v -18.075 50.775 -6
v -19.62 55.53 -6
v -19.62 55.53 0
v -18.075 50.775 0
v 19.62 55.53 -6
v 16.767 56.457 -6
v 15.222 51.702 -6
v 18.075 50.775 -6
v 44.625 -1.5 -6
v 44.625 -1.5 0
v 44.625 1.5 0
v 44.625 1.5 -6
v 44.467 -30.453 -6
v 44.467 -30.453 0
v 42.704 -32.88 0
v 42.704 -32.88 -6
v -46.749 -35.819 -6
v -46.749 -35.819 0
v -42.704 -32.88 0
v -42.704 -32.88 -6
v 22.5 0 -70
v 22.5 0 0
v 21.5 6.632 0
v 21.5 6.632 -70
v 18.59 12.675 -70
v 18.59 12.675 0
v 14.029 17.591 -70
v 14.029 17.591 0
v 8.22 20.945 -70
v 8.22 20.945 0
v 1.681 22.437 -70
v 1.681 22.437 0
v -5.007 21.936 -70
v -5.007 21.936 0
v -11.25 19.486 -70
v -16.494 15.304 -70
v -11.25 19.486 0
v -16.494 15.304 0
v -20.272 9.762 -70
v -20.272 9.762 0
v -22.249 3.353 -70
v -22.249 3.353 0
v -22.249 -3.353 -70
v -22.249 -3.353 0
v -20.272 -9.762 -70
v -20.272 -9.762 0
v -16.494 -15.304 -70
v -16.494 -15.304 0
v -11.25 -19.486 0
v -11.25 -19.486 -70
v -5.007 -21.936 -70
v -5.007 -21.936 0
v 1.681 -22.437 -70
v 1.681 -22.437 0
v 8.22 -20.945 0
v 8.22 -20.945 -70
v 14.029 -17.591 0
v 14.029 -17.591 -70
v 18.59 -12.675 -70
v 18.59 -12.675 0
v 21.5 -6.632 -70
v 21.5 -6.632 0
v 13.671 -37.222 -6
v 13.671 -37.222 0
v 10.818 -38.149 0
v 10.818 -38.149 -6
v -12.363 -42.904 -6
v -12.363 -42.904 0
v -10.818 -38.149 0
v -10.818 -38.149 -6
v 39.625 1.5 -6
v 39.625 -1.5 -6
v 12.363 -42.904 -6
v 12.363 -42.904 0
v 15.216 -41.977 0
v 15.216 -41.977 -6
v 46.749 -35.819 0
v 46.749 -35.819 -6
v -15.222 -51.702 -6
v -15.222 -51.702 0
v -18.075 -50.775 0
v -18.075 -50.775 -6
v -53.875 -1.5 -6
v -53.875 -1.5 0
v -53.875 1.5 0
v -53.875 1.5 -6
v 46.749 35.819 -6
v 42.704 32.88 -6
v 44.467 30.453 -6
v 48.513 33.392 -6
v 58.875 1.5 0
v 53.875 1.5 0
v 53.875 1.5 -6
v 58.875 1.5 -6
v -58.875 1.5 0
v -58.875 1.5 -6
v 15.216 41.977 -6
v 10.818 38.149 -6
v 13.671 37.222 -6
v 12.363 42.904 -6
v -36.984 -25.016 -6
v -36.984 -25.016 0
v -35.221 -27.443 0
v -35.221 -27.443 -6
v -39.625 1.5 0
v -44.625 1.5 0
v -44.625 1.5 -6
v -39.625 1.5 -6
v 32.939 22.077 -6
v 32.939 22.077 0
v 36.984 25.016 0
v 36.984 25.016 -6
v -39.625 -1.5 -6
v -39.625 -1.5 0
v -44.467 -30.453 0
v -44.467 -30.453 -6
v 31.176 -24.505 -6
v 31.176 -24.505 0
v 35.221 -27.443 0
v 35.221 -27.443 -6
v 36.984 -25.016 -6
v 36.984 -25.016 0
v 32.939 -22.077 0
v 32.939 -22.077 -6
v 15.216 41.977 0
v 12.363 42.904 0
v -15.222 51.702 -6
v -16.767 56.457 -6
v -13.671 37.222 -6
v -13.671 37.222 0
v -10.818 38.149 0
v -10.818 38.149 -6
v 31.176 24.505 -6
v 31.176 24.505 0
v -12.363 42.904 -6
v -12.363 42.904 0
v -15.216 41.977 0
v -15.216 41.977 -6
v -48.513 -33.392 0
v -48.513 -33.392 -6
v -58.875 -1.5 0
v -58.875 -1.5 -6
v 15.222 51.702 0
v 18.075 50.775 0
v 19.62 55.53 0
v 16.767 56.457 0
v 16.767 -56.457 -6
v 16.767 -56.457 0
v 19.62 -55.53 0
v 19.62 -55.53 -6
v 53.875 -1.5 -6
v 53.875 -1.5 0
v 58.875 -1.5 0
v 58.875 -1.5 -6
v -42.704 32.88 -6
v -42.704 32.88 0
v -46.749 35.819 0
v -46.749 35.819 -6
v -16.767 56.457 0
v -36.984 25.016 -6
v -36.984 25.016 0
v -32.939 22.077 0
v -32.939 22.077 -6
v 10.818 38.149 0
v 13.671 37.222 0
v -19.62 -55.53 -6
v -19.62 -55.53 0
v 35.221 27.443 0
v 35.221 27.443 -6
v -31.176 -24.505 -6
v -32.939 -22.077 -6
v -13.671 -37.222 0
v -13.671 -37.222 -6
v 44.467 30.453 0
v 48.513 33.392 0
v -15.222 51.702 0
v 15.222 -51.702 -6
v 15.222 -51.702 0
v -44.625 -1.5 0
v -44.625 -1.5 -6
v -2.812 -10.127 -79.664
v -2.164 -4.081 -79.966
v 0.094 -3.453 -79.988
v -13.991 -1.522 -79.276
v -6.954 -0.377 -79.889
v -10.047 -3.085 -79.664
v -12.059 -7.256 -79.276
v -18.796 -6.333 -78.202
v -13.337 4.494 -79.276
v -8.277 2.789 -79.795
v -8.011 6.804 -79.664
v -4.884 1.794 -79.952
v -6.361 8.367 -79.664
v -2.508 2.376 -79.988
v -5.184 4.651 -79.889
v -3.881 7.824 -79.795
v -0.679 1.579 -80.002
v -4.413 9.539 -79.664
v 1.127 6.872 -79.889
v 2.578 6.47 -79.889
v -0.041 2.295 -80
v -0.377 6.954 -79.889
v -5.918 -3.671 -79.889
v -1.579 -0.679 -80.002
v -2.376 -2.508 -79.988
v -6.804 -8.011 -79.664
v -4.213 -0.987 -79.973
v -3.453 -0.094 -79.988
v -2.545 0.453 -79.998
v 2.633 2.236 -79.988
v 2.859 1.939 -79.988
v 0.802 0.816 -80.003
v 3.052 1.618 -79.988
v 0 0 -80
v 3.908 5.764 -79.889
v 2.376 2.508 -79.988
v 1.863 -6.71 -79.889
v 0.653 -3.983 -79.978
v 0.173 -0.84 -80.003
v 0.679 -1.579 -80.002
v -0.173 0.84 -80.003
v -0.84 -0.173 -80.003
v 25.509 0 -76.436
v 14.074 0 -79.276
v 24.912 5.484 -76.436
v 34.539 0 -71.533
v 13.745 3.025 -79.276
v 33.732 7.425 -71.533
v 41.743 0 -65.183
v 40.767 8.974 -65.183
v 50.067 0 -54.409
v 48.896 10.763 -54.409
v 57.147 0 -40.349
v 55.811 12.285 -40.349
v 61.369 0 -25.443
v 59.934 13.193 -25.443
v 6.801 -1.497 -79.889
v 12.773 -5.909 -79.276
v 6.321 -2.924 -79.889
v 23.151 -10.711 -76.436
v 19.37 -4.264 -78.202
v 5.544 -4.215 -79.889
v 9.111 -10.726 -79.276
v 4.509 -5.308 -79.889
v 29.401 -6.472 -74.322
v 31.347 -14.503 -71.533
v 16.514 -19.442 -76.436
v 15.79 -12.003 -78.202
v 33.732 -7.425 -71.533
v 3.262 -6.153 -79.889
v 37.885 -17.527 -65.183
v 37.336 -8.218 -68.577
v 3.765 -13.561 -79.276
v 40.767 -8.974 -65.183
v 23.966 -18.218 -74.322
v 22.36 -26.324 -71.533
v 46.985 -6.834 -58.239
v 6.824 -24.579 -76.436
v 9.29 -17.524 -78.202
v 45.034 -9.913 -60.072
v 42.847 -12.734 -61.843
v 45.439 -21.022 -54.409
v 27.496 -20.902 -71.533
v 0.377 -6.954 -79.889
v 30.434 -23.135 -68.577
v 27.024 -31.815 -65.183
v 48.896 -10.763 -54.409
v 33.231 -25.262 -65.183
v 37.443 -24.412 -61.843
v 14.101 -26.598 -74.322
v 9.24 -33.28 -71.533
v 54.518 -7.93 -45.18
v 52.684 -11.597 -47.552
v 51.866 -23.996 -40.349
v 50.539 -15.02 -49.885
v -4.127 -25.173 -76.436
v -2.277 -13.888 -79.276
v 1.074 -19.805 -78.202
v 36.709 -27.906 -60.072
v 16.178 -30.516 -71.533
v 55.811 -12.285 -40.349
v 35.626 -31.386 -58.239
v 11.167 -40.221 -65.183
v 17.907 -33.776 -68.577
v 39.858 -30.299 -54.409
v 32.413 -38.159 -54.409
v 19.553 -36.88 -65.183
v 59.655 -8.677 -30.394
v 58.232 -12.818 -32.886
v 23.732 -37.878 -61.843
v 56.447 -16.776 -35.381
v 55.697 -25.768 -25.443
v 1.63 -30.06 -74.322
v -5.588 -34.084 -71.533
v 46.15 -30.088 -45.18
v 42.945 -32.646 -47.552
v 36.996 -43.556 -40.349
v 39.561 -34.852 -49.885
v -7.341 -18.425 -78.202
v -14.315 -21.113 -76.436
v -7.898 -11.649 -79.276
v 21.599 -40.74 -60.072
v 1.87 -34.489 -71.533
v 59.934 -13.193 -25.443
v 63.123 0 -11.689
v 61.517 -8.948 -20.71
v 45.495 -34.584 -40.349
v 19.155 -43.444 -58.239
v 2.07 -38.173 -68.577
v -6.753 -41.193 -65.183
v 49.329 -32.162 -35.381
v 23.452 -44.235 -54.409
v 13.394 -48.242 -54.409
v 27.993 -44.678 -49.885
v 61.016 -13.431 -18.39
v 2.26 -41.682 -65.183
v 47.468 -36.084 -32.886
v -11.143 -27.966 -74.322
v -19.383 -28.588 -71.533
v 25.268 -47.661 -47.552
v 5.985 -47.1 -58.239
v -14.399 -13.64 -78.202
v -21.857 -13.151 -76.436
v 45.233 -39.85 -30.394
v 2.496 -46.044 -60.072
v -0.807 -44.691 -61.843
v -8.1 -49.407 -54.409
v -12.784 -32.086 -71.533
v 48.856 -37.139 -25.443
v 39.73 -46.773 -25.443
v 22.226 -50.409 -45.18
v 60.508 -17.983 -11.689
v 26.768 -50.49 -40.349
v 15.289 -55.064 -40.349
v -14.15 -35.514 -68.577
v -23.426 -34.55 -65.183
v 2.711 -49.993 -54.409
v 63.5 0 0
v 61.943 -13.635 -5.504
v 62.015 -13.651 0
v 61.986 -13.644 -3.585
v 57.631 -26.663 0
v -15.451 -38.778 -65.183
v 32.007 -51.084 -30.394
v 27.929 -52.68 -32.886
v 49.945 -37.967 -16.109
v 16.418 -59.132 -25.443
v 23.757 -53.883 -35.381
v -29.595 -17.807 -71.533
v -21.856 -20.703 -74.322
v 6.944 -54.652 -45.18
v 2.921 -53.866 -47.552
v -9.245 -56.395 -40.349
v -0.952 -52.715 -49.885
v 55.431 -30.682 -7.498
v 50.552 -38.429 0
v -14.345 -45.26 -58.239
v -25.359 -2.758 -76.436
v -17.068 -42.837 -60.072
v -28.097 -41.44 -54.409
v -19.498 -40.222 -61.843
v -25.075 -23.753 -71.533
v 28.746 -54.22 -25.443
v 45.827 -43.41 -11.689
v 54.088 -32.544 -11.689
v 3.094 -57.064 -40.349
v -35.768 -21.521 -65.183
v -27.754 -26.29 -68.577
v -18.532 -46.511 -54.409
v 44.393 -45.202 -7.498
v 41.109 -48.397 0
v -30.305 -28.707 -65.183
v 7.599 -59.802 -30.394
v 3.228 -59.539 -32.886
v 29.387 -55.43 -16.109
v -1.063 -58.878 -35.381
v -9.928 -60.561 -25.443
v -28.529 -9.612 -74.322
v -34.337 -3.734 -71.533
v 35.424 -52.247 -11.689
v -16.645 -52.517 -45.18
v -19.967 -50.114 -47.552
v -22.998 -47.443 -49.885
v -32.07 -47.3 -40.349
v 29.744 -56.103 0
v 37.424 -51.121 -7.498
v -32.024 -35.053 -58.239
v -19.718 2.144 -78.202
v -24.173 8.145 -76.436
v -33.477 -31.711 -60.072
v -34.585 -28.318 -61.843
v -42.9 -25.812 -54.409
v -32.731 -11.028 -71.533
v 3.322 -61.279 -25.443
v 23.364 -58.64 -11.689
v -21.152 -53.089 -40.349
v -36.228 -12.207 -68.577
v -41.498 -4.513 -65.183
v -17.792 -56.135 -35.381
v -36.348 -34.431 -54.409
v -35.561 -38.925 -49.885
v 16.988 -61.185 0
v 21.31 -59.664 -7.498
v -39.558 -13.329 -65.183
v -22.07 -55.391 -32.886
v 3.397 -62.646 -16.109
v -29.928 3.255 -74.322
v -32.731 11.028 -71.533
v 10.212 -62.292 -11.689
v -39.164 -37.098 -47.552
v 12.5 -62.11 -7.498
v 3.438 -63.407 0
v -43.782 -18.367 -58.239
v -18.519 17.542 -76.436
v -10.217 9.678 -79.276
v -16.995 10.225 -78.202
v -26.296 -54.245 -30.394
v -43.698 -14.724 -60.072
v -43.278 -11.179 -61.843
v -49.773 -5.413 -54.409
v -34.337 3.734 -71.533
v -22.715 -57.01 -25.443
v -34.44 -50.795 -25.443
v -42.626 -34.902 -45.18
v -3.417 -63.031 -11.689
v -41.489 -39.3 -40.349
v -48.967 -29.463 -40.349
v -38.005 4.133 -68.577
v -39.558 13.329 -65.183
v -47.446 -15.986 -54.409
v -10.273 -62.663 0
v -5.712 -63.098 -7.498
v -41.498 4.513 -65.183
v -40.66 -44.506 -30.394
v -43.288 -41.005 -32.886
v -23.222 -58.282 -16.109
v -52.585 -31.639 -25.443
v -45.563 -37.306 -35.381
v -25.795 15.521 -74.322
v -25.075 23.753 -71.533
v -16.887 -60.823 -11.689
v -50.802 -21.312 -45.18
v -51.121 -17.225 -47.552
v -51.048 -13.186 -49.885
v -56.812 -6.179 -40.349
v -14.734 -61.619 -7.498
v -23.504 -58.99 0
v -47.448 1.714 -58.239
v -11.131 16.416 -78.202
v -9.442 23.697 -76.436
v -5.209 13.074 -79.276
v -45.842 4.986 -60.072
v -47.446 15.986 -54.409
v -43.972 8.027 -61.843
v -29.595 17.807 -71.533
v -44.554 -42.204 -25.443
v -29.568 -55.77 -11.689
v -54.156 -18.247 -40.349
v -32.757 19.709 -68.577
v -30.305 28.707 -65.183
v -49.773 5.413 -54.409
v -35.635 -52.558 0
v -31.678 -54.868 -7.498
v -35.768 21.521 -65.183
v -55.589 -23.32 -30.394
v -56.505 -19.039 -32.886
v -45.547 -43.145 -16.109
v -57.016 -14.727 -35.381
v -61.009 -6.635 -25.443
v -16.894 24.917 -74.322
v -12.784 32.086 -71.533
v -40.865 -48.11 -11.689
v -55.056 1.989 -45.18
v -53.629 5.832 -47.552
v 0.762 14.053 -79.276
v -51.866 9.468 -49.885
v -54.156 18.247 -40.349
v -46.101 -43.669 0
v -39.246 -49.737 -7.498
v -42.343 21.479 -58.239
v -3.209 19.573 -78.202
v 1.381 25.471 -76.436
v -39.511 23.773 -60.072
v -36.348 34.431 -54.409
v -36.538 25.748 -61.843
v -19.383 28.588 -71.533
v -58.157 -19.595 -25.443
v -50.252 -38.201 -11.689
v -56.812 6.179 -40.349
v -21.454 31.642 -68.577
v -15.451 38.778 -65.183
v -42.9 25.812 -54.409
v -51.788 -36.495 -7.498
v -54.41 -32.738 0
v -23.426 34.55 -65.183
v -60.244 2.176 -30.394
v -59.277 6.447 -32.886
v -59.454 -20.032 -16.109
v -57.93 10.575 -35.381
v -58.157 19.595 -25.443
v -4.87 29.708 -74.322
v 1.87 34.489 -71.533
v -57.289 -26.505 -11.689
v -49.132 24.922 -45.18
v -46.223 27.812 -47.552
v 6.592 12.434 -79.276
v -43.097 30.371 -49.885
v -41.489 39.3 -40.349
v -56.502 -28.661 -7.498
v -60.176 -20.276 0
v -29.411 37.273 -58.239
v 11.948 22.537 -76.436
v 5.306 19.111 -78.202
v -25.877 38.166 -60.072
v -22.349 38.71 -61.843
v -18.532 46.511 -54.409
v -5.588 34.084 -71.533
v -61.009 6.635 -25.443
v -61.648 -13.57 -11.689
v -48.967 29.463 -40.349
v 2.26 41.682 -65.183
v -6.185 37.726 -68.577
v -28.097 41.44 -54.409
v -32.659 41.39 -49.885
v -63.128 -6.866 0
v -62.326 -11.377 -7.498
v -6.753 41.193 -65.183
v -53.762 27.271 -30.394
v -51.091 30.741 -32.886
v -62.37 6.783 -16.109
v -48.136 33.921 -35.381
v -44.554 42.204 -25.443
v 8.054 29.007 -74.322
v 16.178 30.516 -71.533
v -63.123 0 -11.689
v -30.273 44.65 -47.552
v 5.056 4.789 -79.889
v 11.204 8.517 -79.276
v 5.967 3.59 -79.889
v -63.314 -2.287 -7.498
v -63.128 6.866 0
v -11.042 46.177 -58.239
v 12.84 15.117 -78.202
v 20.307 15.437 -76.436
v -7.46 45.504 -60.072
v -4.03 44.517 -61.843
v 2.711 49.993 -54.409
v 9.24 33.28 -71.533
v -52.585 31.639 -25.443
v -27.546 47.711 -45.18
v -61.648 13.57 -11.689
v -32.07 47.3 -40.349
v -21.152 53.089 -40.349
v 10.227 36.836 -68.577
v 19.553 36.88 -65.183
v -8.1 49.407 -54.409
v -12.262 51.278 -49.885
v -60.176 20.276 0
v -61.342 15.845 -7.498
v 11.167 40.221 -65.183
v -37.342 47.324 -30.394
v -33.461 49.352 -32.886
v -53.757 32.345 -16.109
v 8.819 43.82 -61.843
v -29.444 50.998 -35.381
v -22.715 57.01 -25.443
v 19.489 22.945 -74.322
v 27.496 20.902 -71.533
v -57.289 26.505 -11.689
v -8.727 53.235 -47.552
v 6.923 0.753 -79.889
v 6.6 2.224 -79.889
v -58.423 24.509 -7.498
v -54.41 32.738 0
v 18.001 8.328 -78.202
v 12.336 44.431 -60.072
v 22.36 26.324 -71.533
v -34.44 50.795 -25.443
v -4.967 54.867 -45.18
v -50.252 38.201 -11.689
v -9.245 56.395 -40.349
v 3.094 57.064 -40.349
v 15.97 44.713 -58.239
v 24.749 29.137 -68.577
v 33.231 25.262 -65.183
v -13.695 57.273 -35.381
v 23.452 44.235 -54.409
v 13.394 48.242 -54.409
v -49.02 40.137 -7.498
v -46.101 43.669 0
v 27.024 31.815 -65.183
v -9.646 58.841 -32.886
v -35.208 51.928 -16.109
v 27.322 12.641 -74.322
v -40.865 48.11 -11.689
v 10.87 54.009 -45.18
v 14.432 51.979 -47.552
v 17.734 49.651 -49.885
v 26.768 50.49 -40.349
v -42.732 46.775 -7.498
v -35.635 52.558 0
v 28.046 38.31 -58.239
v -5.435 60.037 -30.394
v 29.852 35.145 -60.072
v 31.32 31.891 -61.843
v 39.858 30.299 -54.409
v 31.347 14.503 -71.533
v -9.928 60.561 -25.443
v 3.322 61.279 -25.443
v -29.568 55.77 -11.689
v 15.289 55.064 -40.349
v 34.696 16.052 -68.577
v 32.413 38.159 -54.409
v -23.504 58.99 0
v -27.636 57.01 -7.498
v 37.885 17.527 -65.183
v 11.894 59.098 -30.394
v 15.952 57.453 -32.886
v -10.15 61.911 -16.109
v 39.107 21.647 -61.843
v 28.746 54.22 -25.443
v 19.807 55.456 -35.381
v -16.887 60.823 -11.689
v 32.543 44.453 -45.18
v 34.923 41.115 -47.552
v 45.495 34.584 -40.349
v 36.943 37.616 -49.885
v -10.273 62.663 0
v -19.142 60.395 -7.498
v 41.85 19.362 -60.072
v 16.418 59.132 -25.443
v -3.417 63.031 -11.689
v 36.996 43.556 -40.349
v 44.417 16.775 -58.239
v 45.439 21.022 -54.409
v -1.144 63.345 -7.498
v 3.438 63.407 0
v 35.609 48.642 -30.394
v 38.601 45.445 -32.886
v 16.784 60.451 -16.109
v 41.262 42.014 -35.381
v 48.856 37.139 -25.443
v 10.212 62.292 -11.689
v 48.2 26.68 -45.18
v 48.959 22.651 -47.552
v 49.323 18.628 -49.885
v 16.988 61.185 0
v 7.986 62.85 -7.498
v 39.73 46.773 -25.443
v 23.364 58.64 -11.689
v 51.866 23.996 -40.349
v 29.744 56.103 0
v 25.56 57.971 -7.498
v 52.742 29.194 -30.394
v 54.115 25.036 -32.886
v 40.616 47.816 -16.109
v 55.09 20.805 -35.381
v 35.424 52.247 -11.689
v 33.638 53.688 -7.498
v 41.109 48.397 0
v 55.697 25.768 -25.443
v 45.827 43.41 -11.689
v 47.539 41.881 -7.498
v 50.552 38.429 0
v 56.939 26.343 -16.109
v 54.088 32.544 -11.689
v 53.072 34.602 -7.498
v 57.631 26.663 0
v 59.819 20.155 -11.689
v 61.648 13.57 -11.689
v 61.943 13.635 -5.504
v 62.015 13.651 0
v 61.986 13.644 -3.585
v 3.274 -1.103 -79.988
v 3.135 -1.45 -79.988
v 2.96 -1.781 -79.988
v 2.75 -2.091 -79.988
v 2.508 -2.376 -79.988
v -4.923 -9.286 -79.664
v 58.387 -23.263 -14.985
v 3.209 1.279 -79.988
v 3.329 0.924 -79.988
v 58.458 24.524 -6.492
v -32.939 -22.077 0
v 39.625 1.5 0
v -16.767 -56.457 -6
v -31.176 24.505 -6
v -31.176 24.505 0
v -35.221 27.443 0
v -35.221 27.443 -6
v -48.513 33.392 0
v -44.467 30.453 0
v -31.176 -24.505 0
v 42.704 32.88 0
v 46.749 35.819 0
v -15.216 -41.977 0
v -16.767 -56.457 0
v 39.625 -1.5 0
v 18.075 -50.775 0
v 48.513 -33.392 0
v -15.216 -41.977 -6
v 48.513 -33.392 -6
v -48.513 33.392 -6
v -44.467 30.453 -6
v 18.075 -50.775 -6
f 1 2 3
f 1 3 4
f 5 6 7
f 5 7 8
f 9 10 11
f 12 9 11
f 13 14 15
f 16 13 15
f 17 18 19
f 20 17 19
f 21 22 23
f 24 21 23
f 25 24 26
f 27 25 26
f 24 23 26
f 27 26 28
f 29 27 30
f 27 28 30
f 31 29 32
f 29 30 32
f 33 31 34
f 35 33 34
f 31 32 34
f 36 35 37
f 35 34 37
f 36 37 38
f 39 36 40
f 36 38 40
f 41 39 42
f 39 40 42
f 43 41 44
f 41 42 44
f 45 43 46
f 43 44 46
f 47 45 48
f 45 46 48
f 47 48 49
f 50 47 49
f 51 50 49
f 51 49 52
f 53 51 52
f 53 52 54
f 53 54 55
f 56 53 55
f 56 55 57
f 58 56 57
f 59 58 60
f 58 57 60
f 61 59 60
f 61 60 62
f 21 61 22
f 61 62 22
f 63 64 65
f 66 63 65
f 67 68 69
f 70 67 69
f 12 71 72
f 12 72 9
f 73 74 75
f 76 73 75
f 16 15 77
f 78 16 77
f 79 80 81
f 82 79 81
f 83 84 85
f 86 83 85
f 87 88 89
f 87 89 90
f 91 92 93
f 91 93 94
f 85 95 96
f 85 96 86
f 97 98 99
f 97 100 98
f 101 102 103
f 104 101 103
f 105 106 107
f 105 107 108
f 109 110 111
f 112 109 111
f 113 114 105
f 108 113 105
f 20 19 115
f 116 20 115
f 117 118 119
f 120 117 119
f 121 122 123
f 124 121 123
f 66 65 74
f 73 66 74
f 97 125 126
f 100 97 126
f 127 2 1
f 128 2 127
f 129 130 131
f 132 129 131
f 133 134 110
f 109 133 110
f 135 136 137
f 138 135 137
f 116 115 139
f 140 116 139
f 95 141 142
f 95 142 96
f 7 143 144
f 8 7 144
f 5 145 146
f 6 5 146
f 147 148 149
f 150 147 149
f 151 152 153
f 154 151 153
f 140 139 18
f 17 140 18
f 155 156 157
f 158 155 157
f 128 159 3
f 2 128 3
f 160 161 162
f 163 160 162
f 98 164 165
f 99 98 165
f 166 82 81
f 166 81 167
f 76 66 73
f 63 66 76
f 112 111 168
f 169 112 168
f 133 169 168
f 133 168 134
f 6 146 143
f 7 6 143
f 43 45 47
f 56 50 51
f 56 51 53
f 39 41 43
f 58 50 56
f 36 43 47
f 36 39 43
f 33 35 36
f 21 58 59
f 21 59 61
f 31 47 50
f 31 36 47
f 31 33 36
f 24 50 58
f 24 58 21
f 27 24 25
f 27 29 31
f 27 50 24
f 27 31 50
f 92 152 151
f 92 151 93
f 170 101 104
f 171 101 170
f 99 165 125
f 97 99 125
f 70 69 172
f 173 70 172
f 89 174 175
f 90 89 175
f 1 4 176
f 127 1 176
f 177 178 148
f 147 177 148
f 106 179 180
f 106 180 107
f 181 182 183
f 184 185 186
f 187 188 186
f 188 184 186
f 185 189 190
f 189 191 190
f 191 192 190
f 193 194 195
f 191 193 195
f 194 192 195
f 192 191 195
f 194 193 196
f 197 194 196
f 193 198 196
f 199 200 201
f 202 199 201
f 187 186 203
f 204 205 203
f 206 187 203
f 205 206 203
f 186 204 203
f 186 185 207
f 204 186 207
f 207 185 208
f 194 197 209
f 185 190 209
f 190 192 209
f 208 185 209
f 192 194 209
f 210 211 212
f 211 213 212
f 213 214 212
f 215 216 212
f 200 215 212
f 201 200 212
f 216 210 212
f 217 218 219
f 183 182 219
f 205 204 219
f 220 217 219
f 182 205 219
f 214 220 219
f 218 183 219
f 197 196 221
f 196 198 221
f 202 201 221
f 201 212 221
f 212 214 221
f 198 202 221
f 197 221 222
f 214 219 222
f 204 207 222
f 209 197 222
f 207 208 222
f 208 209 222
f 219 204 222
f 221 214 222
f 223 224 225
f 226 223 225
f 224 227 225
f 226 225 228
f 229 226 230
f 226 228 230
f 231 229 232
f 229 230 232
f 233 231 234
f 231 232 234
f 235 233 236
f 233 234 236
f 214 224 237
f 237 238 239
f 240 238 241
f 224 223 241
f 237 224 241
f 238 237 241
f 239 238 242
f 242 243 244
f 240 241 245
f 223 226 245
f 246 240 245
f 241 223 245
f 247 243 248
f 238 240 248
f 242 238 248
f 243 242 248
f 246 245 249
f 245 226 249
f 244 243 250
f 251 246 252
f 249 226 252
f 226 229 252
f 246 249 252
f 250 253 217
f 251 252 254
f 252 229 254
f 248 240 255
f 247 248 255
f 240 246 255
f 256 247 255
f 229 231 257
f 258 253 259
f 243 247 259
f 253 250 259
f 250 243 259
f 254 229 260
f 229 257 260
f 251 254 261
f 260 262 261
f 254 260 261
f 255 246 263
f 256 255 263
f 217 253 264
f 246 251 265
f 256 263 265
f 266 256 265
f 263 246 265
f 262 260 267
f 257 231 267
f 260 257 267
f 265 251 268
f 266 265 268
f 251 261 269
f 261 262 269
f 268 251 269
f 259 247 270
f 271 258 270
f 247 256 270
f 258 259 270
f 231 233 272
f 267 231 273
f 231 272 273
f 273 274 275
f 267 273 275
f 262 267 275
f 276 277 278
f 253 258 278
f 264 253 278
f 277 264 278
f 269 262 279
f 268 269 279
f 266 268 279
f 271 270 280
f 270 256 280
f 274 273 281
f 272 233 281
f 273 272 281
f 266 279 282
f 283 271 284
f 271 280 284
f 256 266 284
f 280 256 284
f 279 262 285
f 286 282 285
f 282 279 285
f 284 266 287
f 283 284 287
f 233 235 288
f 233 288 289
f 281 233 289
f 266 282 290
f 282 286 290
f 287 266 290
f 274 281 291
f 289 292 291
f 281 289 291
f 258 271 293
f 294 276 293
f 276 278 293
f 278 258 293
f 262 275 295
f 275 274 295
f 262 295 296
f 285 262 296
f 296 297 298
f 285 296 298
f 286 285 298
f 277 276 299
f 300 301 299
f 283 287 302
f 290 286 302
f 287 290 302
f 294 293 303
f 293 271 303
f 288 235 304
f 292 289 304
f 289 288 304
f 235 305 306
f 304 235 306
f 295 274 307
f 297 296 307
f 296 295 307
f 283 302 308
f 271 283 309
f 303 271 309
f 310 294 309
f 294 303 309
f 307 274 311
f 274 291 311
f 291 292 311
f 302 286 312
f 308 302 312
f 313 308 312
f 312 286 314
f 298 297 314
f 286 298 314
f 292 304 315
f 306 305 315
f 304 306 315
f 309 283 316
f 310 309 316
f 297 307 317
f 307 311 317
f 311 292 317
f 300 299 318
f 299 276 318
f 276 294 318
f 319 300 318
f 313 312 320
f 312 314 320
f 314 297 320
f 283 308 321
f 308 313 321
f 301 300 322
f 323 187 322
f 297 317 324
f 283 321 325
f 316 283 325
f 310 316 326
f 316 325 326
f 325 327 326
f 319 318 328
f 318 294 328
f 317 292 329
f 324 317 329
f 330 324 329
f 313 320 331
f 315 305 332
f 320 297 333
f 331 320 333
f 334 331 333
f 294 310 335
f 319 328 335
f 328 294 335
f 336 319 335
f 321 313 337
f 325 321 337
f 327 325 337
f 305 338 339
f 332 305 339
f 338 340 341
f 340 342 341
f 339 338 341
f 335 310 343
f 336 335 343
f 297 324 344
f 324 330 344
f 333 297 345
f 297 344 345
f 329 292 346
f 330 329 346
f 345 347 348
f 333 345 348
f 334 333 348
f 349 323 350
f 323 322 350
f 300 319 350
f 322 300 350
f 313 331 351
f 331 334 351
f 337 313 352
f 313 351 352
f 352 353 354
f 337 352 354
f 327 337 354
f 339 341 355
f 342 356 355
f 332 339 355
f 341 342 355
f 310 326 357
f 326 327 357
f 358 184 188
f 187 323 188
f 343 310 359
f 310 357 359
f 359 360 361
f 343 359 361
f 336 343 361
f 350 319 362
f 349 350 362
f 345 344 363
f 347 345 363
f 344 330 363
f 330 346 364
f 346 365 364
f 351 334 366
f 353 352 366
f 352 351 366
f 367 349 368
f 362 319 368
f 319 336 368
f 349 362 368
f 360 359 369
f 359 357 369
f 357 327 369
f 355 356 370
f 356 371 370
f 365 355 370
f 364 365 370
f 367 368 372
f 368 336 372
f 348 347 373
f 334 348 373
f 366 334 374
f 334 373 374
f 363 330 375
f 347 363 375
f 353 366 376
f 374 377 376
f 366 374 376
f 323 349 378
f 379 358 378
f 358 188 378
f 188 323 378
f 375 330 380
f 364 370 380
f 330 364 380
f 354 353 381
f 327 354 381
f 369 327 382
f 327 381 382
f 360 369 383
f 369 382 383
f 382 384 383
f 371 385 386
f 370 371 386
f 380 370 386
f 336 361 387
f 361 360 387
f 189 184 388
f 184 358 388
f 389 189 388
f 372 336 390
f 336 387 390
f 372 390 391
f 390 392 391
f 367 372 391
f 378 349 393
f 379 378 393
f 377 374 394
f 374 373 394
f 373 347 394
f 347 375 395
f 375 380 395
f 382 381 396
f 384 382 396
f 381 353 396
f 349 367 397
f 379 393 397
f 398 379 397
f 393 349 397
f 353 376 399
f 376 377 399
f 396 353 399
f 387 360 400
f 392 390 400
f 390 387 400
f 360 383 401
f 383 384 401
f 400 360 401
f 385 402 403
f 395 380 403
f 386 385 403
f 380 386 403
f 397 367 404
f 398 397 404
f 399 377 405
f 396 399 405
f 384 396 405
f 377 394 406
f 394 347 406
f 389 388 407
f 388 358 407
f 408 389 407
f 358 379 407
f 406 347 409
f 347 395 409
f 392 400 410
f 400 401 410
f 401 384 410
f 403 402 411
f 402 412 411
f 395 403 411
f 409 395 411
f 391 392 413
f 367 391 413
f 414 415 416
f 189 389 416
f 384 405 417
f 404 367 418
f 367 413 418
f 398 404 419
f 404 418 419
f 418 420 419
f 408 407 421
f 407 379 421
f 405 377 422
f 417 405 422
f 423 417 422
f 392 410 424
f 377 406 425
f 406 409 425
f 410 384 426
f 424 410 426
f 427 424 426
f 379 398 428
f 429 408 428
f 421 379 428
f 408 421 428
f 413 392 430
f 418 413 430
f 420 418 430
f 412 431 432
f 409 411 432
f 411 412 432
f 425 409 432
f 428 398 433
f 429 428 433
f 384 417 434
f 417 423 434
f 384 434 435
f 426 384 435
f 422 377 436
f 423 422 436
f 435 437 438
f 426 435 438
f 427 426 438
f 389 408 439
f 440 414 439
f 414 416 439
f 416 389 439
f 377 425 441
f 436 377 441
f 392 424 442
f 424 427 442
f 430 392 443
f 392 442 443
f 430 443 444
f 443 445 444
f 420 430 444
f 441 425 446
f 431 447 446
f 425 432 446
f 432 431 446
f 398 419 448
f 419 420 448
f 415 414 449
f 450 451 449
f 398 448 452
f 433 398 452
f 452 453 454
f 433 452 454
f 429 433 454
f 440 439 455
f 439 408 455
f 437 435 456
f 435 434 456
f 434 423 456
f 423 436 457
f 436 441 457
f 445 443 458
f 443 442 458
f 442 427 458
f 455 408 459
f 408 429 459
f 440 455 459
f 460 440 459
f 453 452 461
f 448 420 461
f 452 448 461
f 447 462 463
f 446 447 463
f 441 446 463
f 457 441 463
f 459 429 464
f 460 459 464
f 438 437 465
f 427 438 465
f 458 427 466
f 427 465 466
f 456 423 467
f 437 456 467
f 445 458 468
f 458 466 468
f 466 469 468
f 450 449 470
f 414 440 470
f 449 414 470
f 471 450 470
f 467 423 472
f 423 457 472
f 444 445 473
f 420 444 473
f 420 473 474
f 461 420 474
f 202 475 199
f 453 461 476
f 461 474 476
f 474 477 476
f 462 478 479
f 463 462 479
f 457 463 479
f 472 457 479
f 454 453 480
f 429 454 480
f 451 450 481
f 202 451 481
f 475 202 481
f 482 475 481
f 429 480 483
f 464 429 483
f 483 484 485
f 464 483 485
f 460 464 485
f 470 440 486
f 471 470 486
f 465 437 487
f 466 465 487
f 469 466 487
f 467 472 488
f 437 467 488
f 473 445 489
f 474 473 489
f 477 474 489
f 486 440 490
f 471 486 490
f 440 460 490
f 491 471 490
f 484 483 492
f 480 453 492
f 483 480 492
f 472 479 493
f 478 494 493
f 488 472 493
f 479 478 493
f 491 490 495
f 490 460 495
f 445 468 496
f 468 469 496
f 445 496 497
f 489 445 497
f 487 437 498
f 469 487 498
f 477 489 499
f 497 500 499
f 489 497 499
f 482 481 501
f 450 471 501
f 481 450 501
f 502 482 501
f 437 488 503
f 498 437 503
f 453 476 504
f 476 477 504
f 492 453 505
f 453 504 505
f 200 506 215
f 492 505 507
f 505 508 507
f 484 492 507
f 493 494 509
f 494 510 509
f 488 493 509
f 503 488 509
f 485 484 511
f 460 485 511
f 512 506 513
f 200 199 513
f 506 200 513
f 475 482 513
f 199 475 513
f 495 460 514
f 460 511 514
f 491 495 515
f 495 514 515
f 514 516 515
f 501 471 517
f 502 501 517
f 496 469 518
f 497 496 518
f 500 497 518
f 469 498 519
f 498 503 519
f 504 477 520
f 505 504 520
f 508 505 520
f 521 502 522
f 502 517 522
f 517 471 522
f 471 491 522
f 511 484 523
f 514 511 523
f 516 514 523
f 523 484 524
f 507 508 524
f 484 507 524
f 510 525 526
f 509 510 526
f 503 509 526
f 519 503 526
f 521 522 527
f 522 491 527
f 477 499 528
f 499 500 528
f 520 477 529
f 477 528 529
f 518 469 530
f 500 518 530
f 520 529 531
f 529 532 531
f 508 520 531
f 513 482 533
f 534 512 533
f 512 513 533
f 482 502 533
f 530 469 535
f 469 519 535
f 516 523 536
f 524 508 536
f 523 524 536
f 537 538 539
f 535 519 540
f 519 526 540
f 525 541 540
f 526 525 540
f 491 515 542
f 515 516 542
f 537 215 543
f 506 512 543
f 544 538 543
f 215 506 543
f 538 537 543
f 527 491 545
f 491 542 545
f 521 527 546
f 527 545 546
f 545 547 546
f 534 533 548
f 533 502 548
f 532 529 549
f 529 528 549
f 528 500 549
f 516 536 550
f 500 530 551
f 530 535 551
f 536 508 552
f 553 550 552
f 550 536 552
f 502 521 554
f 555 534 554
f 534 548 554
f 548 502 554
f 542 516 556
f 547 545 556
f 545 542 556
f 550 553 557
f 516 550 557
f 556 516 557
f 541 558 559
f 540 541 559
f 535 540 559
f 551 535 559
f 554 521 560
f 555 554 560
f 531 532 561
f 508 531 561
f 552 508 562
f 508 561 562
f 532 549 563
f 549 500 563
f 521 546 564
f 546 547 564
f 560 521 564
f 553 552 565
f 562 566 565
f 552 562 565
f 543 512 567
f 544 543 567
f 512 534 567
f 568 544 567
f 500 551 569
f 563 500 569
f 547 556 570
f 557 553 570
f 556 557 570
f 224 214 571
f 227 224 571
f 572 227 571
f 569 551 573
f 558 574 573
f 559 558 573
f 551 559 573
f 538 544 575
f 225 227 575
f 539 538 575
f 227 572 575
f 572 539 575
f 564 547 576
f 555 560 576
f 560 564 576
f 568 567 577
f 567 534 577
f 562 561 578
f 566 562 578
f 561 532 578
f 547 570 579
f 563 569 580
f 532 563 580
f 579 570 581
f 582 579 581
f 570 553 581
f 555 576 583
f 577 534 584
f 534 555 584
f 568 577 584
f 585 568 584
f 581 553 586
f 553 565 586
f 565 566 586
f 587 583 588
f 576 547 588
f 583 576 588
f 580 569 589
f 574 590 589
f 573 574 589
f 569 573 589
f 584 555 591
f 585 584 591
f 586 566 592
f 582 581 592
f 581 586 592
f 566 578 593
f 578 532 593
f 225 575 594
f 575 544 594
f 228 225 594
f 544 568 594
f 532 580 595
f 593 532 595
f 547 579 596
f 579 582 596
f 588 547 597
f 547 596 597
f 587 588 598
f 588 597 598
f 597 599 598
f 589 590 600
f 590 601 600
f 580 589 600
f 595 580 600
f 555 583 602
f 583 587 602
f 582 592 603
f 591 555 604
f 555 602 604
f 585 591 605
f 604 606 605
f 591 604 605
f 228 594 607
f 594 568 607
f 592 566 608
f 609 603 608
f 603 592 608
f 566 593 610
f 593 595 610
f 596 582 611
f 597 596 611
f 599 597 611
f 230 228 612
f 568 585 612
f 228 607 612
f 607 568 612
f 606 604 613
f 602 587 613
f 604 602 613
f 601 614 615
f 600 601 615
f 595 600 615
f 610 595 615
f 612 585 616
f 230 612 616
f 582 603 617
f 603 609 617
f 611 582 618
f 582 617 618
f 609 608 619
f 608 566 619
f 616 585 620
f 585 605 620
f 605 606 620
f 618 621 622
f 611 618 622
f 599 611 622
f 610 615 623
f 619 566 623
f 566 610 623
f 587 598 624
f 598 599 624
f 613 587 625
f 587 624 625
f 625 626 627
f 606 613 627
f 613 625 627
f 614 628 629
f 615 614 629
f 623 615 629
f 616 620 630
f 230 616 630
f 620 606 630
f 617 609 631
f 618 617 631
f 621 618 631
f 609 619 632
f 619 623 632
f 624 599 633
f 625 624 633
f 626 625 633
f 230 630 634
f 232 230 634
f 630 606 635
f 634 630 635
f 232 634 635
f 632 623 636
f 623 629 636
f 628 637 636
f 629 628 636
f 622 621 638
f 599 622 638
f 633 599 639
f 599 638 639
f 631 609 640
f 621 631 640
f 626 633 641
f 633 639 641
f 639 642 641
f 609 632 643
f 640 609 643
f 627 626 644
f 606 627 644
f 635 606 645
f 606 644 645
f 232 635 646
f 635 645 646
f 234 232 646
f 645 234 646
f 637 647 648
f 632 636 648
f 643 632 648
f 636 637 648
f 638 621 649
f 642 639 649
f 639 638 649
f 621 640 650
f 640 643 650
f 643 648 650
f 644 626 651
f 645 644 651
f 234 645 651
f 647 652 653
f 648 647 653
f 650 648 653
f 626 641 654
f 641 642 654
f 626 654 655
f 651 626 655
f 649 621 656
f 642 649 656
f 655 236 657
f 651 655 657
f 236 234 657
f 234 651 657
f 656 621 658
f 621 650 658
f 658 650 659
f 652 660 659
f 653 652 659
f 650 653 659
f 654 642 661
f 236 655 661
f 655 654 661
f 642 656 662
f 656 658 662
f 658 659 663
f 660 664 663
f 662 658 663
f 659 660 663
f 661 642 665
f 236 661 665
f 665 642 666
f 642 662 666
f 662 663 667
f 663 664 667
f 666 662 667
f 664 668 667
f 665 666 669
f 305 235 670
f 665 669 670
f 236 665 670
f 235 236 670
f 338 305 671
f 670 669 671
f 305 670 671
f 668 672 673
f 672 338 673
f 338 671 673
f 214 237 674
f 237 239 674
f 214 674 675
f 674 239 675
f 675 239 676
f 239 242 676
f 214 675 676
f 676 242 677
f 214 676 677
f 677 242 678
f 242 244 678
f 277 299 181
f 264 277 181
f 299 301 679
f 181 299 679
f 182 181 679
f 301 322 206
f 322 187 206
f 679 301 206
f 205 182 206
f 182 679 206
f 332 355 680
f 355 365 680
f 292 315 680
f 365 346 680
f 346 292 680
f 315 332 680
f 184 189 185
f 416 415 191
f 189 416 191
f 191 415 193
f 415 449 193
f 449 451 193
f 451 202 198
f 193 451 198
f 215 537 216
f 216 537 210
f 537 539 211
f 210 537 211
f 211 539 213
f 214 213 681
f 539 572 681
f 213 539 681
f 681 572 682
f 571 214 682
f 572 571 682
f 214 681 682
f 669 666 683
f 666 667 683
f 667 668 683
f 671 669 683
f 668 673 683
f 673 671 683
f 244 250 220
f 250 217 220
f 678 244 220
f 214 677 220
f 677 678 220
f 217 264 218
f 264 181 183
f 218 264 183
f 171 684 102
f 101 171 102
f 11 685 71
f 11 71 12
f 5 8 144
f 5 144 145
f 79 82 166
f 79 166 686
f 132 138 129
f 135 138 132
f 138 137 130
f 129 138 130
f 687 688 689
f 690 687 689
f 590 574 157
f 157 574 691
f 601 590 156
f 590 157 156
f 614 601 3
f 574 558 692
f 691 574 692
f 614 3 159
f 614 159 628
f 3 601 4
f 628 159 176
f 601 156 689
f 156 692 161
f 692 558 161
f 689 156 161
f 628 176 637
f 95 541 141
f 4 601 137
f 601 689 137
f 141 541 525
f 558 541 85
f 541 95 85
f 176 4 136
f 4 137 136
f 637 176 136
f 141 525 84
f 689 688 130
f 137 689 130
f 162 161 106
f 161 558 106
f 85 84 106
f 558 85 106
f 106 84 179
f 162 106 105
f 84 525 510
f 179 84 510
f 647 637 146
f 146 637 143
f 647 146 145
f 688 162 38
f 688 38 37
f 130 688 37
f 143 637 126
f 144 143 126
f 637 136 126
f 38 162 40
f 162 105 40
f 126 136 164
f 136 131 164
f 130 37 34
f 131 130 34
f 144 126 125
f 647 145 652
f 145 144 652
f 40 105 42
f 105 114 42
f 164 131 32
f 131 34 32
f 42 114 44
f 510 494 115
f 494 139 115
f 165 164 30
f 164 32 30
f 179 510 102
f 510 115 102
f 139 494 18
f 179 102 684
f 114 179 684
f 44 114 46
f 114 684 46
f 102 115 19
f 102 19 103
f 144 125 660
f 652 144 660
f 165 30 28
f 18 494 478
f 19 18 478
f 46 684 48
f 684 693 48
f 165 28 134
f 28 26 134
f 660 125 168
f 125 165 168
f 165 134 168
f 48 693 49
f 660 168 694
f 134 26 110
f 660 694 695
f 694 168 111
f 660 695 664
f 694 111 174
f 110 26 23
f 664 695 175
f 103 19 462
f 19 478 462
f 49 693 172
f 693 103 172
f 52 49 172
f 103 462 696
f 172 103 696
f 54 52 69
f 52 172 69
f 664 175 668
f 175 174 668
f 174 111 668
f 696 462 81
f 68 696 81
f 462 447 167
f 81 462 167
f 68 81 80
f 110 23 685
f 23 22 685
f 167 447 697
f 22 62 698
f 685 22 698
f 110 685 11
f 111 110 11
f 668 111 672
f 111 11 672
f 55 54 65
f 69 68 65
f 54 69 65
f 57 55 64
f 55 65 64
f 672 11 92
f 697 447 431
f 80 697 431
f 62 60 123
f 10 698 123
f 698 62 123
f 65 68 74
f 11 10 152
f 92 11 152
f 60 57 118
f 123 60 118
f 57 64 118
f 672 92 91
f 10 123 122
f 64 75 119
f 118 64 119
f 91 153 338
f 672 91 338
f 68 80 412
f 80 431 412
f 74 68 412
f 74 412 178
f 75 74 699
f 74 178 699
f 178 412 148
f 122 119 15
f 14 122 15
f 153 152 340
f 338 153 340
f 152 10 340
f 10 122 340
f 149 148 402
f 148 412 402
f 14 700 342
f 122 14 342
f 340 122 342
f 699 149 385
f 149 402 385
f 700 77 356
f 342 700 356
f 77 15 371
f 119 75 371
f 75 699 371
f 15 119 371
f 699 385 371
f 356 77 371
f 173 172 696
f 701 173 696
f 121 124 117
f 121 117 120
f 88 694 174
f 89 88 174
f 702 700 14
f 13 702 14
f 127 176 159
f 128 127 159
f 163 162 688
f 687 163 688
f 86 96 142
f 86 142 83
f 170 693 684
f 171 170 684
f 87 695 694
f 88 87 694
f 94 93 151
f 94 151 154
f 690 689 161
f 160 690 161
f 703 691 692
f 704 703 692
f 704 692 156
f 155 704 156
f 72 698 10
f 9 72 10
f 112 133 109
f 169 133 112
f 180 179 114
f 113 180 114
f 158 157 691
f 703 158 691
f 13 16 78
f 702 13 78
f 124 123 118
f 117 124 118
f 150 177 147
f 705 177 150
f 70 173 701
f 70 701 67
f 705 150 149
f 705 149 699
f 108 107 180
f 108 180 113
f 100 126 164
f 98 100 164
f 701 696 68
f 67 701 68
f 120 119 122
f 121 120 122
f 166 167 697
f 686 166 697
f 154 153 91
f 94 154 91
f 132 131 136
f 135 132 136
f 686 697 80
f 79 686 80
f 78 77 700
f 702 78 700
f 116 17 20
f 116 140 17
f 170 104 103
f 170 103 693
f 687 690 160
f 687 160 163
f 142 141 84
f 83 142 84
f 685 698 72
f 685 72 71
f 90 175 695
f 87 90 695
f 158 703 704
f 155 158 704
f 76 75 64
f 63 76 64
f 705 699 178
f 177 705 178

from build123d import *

# Parameters (mm, degrees)
F2_R     = 22.5
F3_DEPTH = 70
F4_W     = 5
F4_H     = 3
F5_DEPTH = 6


with BuildPart() as f1:
    # F0 (on Front) → F1 (revolve)
    with BuildSketch(Plane.XZ):
        with BuildLine():
            Line((63.5, 0), (0, 0))
            Line((0, 0), (0, -80))
            add(Edge.make_bspline(
                [(0, -80), (10.2409981191, -80.0559148192), (34.8220828583, -78.7447738141), (62.2798344564, -39.0297563597), (63.5, -9.5845087473), (63.5, 0)],
                knots=[0, 0, 0, 0, 0.3058329124, 0.6687596422, 1, 1, 1, 1], degree=3))
        make_face()
    revolve(axis=Axis((0, 0, -40), (0, 0, -1)))

    # F2 (on face) → F3 (cut)
    with BuildSketch(Plane.XY):
        Circle(F2_R)
    extrude(amount=-F3_DEPTH, mode=Mode.SUBTRACT)

    # F4 (on Top) → F5 (cut)
    with BuildSketch(Plane.XY):
        with Locations((-42.125, 0)):
            Rectangle(F4_W, F4_H)
        with Locations((-56.375, 0)):
            Rectangle(F4_W, F4_H)
        Polygon((-46.7491976654, -35.8193822203), (-42.7041126935, -32.8804559588), (-44.4674684504, -30.4534049757), (-48.5125534223, -33.3923312372), align=None)
        Polygon((-31.1756205237, -24.5045161137), (-32.9389762805, -22.0774651305), (-36.9840612524, -25.016391392), (-35.2207054955, -27.4434423751), align=None)
        Polygon((-16.7667907694, -56.4569778884), (-15.2217057975, -51.701695307), (-18.0748753464, -50.7746443238), (-19.6199603183, -55.5299269053), align=None)
        Polygon((-10.8182136277, -38.1491399498), (-13.6713831766, -37.2220889666), (-15.2164681484, -41.9773715481), (-12.3632985995, -42.9044225312), align=None)
        Polygon((19.6199603183, -55.5299269053), (18.0748753464, -50.7746443238), (15.2217057975, -51.701695307), (16.7667907694, -56.4569778884), align=None)
        Polygon((13.6713831766, -37.2220889666), (10.8182136277, -38.1491399498), (12.3632985995, -42.9044225312), (15.2164681484, -41.9773715481), align=None)
        Polygon((48.5125534223, -33.3923312372), (44.4674684504, -30.4534049757), (42.7041126935, -32.8804559588), (46.7491976654, -35.8193822203), align=None)
        Polygon((32.9389762805, -22.0774651305), (31.1756205237, -24.5045161137), (35.2207054955, -27.4434423751), (36.9840612524, -25.016391392), align=None)
        with Locations((56.375, 0)):
            Rectangle(F4_W, F4_H)
        with Locations((42.125, 0)):
            Rectangle(F4_W, F4_H)
        Polygon((46.7491976654, 35.8193822203), (42.7041126935, 32.8804559588), (44.4674684504, 30.4534049757), (48.5125534223, 33.3923312372), align=None)
        Polygon((31.1756205237, 24.5045161137), (32.9389762805, 22.0774651305), (36.9840612524, 25.016391392), (35.2207054955, 27.4434423751), align=None)
        Polygon((16.7667907694, 56.4569778884), (15.2217057975, 51.701695307), (18.0748753464, 50.7746443238), (19.6199603183, 55.5299269053), align=None)
        Polygon((10.8182136277, 38.1491399498), (13.6713831766, 37.2220889666), (15.2164681484, 41.9773715481), (12.3632985995, 42.9044225312), align=None)
        Polygon((-19.6199603183, 55.5299269053), (-18.0748753464, 50.7746443238), (-15.2217057975, 51.701695307), (-16.7667907694, 56.4569778884), align=None)
        Polygon((-13.6713831766, 37.2220889666), (-10.8182136277, 38.1491399498), (-12.3632985995, 42.9044225312), (-15.2164681484, 41.9773715481), align=None)
        Polygon((-48.5125534223, 33.3923312372), (-44.4674684504, 30.4534049757), (-42.7041126935, 32.8804559588), (-46.7491976654, 35.8193822203), align=None)
        Polygon((-32.9389762805, 22.0774651305), (-31.1756205237, 24.5045161137), (-35.2207054955, 27.4434423751), (-36.9840612524, 25.016391392), align=None)
    extrude(amount=-F5_DEPTH, mode=Mode.SUBTRACT)


solid = f1.part
